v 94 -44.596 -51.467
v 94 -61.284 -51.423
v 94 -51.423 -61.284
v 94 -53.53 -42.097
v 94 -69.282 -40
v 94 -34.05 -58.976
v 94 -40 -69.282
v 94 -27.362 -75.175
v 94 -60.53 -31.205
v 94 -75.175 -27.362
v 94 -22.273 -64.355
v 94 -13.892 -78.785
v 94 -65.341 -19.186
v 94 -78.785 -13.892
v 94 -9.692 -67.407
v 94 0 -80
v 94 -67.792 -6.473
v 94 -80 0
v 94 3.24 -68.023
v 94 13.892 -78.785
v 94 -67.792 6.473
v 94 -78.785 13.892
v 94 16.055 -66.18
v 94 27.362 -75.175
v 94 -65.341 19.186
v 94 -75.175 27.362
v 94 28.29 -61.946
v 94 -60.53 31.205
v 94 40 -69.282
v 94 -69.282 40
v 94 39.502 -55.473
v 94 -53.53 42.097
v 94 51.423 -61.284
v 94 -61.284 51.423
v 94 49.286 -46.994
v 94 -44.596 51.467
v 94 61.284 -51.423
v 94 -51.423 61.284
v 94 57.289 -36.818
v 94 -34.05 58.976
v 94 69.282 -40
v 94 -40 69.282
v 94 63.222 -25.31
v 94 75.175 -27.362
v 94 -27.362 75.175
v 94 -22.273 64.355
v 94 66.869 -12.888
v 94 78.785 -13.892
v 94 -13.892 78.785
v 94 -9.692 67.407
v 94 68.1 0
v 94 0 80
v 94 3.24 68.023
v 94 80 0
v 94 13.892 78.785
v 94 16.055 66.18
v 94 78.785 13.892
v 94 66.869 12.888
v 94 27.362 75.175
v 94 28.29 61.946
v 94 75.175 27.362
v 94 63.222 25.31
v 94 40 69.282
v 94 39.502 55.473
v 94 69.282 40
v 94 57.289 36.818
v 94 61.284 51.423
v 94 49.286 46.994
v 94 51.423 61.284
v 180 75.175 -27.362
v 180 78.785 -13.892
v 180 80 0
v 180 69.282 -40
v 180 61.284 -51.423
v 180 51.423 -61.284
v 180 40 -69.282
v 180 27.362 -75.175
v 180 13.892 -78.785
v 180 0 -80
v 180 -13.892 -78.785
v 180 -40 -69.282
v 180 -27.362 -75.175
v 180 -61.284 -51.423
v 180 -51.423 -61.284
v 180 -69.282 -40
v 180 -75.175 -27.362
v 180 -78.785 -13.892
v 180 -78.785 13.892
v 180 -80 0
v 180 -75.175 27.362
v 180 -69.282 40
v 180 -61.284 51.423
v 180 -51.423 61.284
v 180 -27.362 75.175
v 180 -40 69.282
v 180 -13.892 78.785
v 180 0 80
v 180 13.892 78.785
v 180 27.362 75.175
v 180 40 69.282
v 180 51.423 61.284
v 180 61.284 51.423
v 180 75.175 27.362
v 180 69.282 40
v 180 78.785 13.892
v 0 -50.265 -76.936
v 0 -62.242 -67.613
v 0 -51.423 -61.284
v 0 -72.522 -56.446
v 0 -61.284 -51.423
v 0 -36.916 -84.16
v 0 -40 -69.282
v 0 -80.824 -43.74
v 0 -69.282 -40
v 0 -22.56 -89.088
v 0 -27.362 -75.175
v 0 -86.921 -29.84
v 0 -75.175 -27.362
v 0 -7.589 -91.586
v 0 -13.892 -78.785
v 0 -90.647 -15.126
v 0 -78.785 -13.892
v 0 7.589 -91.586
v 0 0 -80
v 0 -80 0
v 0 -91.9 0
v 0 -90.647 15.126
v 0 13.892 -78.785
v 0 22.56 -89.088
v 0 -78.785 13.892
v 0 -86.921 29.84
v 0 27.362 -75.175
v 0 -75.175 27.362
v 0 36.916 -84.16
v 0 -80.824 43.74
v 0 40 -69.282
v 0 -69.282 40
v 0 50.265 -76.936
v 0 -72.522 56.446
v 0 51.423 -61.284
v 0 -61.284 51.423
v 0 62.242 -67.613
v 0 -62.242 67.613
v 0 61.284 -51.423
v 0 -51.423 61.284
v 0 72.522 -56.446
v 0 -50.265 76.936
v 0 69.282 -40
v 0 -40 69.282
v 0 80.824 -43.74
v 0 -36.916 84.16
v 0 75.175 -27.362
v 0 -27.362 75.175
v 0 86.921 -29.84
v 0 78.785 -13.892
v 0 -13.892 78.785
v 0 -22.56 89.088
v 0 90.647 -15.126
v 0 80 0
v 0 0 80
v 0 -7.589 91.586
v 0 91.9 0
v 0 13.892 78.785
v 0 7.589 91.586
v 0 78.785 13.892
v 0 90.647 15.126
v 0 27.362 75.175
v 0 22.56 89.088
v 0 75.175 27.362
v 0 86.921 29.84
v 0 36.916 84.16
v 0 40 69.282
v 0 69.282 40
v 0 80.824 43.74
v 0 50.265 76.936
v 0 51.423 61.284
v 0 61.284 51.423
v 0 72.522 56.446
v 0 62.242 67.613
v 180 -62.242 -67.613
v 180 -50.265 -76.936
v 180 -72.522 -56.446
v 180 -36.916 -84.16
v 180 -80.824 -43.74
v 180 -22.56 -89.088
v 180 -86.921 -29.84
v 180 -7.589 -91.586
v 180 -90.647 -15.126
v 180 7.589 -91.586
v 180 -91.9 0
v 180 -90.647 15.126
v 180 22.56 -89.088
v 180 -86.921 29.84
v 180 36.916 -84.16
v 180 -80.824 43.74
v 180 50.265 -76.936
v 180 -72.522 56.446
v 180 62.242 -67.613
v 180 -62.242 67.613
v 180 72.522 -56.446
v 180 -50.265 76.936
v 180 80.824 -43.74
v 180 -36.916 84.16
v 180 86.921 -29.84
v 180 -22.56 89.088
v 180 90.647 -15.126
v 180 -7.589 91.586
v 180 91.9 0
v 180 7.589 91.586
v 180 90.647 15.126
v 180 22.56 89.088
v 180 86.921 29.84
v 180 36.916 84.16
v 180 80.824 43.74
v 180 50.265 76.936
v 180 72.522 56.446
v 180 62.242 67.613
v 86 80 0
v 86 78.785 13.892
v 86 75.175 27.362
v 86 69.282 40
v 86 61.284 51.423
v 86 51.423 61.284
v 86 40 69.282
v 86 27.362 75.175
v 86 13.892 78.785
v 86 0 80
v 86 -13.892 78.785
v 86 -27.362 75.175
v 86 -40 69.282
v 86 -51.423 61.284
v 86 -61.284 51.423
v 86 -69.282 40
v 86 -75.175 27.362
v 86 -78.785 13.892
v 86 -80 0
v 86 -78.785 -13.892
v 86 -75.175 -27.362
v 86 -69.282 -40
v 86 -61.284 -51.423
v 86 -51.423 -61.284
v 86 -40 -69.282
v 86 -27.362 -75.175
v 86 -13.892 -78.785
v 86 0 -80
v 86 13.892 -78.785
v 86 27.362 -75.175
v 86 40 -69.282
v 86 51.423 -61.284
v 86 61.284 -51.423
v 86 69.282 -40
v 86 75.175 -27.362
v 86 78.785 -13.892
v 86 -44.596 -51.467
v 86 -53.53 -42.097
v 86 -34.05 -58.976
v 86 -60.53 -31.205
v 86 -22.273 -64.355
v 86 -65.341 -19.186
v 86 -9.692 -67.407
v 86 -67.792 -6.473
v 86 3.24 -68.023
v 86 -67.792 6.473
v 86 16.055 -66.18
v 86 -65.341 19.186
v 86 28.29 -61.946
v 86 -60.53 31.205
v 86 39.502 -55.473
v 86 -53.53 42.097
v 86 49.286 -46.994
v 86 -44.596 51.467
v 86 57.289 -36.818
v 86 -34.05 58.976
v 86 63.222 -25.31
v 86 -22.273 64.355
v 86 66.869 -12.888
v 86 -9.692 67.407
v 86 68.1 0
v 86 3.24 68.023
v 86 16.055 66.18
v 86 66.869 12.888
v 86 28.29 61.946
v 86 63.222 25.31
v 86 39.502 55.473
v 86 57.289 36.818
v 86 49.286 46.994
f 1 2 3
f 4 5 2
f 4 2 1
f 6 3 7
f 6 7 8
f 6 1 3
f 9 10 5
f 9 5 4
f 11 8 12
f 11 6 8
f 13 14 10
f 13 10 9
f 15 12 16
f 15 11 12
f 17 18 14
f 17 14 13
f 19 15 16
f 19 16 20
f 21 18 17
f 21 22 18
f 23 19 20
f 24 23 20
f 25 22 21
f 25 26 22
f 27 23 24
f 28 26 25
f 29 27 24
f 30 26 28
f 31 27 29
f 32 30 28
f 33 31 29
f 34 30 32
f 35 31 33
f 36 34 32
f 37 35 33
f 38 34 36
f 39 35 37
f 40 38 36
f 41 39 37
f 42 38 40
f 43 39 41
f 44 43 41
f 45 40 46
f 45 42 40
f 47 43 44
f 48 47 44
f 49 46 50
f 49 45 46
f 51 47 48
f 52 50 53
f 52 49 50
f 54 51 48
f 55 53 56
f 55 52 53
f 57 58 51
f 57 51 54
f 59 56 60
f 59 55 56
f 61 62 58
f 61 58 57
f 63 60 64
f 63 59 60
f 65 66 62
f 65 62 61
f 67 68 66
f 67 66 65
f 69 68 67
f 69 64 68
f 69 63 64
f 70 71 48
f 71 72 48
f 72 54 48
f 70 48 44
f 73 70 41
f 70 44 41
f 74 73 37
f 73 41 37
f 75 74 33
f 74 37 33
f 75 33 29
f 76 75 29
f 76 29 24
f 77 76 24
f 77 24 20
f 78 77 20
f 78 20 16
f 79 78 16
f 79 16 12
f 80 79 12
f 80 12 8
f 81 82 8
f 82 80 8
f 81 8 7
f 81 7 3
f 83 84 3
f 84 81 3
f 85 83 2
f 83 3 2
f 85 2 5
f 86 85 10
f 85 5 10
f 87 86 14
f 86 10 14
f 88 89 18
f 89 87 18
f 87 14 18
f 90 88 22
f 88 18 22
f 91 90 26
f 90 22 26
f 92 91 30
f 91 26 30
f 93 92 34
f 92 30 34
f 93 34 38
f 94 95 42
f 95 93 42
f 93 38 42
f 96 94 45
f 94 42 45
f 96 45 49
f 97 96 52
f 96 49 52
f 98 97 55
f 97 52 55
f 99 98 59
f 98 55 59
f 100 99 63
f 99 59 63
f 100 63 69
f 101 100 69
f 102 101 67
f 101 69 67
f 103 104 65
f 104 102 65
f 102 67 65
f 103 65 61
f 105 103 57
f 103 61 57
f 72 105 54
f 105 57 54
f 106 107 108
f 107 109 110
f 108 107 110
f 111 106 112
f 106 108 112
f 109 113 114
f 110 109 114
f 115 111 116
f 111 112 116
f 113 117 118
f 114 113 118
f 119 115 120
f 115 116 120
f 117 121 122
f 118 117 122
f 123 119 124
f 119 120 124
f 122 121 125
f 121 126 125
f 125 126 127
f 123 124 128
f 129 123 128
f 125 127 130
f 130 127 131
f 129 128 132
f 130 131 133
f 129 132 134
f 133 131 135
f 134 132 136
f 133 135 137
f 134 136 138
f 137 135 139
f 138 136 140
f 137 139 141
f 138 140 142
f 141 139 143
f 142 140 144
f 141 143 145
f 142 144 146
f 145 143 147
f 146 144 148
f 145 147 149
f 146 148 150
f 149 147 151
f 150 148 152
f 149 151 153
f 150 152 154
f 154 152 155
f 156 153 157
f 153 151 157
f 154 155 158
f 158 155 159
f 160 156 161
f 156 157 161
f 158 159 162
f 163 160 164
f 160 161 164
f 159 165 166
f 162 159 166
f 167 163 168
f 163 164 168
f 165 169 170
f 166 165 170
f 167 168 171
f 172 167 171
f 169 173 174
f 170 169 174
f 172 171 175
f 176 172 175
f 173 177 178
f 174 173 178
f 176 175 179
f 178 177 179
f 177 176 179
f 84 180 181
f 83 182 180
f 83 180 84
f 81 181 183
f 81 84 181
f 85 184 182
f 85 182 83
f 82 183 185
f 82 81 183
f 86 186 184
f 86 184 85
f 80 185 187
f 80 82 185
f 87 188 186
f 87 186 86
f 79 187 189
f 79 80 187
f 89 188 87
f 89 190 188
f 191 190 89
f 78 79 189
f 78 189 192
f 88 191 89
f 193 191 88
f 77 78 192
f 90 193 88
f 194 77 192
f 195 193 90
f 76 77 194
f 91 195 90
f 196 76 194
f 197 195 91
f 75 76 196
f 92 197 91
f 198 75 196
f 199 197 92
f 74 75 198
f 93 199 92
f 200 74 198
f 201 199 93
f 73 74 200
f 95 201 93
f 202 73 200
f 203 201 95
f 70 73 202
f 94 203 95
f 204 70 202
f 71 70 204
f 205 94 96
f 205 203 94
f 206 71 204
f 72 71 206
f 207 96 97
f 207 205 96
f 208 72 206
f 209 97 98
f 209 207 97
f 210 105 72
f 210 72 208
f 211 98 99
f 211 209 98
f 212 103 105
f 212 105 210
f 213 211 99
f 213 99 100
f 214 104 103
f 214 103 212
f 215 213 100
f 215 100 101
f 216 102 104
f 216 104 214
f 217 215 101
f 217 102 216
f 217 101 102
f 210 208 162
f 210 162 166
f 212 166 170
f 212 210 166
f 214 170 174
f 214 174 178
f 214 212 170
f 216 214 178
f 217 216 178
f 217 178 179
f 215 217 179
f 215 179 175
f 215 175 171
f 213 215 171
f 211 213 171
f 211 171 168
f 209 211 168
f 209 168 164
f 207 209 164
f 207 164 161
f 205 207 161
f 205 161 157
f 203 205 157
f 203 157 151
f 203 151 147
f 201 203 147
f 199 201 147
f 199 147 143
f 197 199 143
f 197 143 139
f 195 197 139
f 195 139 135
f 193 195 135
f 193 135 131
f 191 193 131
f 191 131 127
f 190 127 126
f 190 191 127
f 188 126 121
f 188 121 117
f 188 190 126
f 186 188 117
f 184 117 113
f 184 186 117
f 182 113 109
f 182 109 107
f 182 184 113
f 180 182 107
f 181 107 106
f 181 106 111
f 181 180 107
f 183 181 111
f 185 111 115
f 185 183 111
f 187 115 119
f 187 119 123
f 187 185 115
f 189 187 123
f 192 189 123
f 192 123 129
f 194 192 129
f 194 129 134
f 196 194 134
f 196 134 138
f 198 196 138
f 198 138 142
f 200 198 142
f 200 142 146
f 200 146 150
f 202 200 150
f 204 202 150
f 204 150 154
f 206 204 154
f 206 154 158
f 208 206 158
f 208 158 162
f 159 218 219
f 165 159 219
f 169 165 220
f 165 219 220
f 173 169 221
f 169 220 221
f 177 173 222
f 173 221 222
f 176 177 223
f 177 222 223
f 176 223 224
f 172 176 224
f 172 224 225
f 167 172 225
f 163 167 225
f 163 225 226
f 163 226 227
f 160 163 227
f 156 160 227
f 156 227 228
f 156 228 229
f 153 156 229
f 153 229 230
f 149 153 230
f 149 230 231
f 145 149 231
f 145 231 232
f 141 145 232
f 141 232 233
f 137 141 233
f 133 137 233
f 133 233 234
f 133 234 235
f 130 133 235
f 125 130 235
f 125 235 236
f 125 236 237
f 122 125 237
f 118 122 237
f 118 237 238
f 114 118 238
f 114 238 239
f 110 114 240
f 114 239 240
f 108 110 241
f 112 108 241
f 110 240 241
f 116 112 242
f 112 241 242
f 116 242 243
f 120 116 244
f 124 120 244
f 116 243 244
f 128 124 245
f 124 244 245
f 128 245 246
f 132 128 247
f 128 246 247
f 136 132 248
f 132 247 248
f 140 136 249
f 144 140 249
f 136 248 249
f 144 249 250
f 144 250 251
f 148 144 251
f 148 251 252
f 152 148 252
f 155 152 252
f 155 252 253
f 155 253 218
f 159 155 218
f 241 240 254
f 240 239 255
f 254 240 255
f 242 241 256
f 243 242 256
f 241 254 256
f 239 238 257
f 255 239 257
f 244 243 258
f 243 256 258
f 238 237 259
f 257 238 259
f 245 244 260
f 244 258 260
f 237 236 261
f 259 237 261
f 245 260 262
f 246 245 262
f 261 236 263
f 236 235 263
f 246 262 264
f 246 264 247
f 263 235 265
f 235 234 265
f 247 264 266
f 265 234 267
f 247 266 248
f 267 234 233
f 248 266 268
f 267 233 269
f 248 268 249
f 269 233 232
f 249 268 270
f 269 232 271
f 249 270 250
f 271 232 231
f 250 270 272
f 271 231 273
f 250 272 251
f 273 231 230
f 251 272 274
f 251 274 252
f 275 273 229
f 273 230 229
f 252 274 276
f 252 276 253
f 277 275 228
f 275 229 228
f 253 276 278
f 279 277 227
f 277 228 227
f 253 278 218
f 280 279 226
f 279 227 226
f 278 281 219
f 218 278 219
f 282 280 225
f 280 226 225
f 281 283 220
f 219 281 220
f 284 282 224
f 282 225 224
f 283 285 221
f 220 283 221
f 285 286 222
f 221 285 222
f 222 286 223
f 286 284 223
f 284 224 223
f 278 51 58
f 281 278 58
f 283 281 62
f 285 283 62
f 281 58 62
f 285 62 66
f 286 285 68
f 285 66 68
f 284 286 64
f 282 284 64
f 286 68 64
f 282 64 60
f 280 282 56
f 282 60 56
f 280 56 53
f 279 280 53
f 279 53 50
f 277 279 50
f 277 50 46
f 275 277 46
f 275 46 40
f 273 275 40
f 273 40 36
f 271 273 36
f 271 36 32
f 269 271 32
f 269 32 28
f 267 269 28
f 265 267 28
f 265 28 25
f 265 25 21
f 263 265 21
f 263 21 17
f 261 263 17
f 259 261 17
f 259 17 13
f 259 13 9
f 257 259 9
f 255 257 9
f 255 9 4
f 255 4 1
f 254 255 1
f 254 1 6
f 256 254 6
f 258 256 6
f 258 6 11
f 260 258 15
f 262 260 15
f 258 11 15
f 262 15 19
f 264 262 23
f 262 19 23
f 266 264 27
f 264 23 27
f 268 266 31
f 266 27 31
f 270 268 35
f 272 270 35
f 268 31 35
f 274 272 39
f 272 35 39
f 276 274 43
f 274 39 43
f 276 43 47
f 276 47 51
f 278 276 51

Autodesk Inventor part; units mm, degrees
ref_plane "YZ Plane" through (0, 0, 0) normal (1, 0, 0) x (0, 1, 0)
ref_plane "XZ Plane" through (0, 0, 0) normal (0, 1, 0) x (-1, 0, 0)
ref_plane "XY Plane" through (0, 0, 0) normal (0, 0, 1) x (1, 0, 0)
sketch "Sketch1" plane through (0, 0, 0) normal (0, 0, 1) x (1, 0, 0)
  line L0 (0, 0) -> (180, 0)
  line L1 (0, 0) -> (0, 80) construction
  line L2 (0, 80) -> (0, 91.9)
  line L3 (0, 91.9) -> (180, 91.9)
  line L4 (0, 80) -> (86, 80)
  line L5 (86, 80) -> (86, 68.1)
  line L6 (86, 68.1) -> (94, 68.1)
  line L7 (90, 0) -> (90, 91.9) construction
  line L8 (180, 0) -> (180, 80) construction
  line L9 (180, 80) -> (180, 91.9)
  line L10 (180, 80) -> (94, 80)
  line L11 (94, 80) -> (94, 68.1)
  line L12 (86, 68.1) -> (86, 0) construction
  line L13 (94, 68.1) -> (94, 0) construction
  dimension "d0" = 160
  dimension "d2" = 11.9
  dimension "d3" = 8
  dimension "d4" = 86
  dimension "d5" = 11.9
revolve "Revolution1" add sketch "Sketch1" angle 360 about axis through (0, 0, 0) along (1, 0, 0)
equation "\"d0\" = d1"
equation "\"d2\" = s1"
equation "\"d3\" = z1"
equation "\"d4\" = t1"
equation "\"d5\" = s1"
equation "\"d1\" = 160"
equation "\"t1\" = 86"
equation "\"z1\" = 8"
equation "\"s1\" = 11.9"
properties part number "DIN 8063 Муфта, тип M 160" material "ПВХ, непластифицированный"
